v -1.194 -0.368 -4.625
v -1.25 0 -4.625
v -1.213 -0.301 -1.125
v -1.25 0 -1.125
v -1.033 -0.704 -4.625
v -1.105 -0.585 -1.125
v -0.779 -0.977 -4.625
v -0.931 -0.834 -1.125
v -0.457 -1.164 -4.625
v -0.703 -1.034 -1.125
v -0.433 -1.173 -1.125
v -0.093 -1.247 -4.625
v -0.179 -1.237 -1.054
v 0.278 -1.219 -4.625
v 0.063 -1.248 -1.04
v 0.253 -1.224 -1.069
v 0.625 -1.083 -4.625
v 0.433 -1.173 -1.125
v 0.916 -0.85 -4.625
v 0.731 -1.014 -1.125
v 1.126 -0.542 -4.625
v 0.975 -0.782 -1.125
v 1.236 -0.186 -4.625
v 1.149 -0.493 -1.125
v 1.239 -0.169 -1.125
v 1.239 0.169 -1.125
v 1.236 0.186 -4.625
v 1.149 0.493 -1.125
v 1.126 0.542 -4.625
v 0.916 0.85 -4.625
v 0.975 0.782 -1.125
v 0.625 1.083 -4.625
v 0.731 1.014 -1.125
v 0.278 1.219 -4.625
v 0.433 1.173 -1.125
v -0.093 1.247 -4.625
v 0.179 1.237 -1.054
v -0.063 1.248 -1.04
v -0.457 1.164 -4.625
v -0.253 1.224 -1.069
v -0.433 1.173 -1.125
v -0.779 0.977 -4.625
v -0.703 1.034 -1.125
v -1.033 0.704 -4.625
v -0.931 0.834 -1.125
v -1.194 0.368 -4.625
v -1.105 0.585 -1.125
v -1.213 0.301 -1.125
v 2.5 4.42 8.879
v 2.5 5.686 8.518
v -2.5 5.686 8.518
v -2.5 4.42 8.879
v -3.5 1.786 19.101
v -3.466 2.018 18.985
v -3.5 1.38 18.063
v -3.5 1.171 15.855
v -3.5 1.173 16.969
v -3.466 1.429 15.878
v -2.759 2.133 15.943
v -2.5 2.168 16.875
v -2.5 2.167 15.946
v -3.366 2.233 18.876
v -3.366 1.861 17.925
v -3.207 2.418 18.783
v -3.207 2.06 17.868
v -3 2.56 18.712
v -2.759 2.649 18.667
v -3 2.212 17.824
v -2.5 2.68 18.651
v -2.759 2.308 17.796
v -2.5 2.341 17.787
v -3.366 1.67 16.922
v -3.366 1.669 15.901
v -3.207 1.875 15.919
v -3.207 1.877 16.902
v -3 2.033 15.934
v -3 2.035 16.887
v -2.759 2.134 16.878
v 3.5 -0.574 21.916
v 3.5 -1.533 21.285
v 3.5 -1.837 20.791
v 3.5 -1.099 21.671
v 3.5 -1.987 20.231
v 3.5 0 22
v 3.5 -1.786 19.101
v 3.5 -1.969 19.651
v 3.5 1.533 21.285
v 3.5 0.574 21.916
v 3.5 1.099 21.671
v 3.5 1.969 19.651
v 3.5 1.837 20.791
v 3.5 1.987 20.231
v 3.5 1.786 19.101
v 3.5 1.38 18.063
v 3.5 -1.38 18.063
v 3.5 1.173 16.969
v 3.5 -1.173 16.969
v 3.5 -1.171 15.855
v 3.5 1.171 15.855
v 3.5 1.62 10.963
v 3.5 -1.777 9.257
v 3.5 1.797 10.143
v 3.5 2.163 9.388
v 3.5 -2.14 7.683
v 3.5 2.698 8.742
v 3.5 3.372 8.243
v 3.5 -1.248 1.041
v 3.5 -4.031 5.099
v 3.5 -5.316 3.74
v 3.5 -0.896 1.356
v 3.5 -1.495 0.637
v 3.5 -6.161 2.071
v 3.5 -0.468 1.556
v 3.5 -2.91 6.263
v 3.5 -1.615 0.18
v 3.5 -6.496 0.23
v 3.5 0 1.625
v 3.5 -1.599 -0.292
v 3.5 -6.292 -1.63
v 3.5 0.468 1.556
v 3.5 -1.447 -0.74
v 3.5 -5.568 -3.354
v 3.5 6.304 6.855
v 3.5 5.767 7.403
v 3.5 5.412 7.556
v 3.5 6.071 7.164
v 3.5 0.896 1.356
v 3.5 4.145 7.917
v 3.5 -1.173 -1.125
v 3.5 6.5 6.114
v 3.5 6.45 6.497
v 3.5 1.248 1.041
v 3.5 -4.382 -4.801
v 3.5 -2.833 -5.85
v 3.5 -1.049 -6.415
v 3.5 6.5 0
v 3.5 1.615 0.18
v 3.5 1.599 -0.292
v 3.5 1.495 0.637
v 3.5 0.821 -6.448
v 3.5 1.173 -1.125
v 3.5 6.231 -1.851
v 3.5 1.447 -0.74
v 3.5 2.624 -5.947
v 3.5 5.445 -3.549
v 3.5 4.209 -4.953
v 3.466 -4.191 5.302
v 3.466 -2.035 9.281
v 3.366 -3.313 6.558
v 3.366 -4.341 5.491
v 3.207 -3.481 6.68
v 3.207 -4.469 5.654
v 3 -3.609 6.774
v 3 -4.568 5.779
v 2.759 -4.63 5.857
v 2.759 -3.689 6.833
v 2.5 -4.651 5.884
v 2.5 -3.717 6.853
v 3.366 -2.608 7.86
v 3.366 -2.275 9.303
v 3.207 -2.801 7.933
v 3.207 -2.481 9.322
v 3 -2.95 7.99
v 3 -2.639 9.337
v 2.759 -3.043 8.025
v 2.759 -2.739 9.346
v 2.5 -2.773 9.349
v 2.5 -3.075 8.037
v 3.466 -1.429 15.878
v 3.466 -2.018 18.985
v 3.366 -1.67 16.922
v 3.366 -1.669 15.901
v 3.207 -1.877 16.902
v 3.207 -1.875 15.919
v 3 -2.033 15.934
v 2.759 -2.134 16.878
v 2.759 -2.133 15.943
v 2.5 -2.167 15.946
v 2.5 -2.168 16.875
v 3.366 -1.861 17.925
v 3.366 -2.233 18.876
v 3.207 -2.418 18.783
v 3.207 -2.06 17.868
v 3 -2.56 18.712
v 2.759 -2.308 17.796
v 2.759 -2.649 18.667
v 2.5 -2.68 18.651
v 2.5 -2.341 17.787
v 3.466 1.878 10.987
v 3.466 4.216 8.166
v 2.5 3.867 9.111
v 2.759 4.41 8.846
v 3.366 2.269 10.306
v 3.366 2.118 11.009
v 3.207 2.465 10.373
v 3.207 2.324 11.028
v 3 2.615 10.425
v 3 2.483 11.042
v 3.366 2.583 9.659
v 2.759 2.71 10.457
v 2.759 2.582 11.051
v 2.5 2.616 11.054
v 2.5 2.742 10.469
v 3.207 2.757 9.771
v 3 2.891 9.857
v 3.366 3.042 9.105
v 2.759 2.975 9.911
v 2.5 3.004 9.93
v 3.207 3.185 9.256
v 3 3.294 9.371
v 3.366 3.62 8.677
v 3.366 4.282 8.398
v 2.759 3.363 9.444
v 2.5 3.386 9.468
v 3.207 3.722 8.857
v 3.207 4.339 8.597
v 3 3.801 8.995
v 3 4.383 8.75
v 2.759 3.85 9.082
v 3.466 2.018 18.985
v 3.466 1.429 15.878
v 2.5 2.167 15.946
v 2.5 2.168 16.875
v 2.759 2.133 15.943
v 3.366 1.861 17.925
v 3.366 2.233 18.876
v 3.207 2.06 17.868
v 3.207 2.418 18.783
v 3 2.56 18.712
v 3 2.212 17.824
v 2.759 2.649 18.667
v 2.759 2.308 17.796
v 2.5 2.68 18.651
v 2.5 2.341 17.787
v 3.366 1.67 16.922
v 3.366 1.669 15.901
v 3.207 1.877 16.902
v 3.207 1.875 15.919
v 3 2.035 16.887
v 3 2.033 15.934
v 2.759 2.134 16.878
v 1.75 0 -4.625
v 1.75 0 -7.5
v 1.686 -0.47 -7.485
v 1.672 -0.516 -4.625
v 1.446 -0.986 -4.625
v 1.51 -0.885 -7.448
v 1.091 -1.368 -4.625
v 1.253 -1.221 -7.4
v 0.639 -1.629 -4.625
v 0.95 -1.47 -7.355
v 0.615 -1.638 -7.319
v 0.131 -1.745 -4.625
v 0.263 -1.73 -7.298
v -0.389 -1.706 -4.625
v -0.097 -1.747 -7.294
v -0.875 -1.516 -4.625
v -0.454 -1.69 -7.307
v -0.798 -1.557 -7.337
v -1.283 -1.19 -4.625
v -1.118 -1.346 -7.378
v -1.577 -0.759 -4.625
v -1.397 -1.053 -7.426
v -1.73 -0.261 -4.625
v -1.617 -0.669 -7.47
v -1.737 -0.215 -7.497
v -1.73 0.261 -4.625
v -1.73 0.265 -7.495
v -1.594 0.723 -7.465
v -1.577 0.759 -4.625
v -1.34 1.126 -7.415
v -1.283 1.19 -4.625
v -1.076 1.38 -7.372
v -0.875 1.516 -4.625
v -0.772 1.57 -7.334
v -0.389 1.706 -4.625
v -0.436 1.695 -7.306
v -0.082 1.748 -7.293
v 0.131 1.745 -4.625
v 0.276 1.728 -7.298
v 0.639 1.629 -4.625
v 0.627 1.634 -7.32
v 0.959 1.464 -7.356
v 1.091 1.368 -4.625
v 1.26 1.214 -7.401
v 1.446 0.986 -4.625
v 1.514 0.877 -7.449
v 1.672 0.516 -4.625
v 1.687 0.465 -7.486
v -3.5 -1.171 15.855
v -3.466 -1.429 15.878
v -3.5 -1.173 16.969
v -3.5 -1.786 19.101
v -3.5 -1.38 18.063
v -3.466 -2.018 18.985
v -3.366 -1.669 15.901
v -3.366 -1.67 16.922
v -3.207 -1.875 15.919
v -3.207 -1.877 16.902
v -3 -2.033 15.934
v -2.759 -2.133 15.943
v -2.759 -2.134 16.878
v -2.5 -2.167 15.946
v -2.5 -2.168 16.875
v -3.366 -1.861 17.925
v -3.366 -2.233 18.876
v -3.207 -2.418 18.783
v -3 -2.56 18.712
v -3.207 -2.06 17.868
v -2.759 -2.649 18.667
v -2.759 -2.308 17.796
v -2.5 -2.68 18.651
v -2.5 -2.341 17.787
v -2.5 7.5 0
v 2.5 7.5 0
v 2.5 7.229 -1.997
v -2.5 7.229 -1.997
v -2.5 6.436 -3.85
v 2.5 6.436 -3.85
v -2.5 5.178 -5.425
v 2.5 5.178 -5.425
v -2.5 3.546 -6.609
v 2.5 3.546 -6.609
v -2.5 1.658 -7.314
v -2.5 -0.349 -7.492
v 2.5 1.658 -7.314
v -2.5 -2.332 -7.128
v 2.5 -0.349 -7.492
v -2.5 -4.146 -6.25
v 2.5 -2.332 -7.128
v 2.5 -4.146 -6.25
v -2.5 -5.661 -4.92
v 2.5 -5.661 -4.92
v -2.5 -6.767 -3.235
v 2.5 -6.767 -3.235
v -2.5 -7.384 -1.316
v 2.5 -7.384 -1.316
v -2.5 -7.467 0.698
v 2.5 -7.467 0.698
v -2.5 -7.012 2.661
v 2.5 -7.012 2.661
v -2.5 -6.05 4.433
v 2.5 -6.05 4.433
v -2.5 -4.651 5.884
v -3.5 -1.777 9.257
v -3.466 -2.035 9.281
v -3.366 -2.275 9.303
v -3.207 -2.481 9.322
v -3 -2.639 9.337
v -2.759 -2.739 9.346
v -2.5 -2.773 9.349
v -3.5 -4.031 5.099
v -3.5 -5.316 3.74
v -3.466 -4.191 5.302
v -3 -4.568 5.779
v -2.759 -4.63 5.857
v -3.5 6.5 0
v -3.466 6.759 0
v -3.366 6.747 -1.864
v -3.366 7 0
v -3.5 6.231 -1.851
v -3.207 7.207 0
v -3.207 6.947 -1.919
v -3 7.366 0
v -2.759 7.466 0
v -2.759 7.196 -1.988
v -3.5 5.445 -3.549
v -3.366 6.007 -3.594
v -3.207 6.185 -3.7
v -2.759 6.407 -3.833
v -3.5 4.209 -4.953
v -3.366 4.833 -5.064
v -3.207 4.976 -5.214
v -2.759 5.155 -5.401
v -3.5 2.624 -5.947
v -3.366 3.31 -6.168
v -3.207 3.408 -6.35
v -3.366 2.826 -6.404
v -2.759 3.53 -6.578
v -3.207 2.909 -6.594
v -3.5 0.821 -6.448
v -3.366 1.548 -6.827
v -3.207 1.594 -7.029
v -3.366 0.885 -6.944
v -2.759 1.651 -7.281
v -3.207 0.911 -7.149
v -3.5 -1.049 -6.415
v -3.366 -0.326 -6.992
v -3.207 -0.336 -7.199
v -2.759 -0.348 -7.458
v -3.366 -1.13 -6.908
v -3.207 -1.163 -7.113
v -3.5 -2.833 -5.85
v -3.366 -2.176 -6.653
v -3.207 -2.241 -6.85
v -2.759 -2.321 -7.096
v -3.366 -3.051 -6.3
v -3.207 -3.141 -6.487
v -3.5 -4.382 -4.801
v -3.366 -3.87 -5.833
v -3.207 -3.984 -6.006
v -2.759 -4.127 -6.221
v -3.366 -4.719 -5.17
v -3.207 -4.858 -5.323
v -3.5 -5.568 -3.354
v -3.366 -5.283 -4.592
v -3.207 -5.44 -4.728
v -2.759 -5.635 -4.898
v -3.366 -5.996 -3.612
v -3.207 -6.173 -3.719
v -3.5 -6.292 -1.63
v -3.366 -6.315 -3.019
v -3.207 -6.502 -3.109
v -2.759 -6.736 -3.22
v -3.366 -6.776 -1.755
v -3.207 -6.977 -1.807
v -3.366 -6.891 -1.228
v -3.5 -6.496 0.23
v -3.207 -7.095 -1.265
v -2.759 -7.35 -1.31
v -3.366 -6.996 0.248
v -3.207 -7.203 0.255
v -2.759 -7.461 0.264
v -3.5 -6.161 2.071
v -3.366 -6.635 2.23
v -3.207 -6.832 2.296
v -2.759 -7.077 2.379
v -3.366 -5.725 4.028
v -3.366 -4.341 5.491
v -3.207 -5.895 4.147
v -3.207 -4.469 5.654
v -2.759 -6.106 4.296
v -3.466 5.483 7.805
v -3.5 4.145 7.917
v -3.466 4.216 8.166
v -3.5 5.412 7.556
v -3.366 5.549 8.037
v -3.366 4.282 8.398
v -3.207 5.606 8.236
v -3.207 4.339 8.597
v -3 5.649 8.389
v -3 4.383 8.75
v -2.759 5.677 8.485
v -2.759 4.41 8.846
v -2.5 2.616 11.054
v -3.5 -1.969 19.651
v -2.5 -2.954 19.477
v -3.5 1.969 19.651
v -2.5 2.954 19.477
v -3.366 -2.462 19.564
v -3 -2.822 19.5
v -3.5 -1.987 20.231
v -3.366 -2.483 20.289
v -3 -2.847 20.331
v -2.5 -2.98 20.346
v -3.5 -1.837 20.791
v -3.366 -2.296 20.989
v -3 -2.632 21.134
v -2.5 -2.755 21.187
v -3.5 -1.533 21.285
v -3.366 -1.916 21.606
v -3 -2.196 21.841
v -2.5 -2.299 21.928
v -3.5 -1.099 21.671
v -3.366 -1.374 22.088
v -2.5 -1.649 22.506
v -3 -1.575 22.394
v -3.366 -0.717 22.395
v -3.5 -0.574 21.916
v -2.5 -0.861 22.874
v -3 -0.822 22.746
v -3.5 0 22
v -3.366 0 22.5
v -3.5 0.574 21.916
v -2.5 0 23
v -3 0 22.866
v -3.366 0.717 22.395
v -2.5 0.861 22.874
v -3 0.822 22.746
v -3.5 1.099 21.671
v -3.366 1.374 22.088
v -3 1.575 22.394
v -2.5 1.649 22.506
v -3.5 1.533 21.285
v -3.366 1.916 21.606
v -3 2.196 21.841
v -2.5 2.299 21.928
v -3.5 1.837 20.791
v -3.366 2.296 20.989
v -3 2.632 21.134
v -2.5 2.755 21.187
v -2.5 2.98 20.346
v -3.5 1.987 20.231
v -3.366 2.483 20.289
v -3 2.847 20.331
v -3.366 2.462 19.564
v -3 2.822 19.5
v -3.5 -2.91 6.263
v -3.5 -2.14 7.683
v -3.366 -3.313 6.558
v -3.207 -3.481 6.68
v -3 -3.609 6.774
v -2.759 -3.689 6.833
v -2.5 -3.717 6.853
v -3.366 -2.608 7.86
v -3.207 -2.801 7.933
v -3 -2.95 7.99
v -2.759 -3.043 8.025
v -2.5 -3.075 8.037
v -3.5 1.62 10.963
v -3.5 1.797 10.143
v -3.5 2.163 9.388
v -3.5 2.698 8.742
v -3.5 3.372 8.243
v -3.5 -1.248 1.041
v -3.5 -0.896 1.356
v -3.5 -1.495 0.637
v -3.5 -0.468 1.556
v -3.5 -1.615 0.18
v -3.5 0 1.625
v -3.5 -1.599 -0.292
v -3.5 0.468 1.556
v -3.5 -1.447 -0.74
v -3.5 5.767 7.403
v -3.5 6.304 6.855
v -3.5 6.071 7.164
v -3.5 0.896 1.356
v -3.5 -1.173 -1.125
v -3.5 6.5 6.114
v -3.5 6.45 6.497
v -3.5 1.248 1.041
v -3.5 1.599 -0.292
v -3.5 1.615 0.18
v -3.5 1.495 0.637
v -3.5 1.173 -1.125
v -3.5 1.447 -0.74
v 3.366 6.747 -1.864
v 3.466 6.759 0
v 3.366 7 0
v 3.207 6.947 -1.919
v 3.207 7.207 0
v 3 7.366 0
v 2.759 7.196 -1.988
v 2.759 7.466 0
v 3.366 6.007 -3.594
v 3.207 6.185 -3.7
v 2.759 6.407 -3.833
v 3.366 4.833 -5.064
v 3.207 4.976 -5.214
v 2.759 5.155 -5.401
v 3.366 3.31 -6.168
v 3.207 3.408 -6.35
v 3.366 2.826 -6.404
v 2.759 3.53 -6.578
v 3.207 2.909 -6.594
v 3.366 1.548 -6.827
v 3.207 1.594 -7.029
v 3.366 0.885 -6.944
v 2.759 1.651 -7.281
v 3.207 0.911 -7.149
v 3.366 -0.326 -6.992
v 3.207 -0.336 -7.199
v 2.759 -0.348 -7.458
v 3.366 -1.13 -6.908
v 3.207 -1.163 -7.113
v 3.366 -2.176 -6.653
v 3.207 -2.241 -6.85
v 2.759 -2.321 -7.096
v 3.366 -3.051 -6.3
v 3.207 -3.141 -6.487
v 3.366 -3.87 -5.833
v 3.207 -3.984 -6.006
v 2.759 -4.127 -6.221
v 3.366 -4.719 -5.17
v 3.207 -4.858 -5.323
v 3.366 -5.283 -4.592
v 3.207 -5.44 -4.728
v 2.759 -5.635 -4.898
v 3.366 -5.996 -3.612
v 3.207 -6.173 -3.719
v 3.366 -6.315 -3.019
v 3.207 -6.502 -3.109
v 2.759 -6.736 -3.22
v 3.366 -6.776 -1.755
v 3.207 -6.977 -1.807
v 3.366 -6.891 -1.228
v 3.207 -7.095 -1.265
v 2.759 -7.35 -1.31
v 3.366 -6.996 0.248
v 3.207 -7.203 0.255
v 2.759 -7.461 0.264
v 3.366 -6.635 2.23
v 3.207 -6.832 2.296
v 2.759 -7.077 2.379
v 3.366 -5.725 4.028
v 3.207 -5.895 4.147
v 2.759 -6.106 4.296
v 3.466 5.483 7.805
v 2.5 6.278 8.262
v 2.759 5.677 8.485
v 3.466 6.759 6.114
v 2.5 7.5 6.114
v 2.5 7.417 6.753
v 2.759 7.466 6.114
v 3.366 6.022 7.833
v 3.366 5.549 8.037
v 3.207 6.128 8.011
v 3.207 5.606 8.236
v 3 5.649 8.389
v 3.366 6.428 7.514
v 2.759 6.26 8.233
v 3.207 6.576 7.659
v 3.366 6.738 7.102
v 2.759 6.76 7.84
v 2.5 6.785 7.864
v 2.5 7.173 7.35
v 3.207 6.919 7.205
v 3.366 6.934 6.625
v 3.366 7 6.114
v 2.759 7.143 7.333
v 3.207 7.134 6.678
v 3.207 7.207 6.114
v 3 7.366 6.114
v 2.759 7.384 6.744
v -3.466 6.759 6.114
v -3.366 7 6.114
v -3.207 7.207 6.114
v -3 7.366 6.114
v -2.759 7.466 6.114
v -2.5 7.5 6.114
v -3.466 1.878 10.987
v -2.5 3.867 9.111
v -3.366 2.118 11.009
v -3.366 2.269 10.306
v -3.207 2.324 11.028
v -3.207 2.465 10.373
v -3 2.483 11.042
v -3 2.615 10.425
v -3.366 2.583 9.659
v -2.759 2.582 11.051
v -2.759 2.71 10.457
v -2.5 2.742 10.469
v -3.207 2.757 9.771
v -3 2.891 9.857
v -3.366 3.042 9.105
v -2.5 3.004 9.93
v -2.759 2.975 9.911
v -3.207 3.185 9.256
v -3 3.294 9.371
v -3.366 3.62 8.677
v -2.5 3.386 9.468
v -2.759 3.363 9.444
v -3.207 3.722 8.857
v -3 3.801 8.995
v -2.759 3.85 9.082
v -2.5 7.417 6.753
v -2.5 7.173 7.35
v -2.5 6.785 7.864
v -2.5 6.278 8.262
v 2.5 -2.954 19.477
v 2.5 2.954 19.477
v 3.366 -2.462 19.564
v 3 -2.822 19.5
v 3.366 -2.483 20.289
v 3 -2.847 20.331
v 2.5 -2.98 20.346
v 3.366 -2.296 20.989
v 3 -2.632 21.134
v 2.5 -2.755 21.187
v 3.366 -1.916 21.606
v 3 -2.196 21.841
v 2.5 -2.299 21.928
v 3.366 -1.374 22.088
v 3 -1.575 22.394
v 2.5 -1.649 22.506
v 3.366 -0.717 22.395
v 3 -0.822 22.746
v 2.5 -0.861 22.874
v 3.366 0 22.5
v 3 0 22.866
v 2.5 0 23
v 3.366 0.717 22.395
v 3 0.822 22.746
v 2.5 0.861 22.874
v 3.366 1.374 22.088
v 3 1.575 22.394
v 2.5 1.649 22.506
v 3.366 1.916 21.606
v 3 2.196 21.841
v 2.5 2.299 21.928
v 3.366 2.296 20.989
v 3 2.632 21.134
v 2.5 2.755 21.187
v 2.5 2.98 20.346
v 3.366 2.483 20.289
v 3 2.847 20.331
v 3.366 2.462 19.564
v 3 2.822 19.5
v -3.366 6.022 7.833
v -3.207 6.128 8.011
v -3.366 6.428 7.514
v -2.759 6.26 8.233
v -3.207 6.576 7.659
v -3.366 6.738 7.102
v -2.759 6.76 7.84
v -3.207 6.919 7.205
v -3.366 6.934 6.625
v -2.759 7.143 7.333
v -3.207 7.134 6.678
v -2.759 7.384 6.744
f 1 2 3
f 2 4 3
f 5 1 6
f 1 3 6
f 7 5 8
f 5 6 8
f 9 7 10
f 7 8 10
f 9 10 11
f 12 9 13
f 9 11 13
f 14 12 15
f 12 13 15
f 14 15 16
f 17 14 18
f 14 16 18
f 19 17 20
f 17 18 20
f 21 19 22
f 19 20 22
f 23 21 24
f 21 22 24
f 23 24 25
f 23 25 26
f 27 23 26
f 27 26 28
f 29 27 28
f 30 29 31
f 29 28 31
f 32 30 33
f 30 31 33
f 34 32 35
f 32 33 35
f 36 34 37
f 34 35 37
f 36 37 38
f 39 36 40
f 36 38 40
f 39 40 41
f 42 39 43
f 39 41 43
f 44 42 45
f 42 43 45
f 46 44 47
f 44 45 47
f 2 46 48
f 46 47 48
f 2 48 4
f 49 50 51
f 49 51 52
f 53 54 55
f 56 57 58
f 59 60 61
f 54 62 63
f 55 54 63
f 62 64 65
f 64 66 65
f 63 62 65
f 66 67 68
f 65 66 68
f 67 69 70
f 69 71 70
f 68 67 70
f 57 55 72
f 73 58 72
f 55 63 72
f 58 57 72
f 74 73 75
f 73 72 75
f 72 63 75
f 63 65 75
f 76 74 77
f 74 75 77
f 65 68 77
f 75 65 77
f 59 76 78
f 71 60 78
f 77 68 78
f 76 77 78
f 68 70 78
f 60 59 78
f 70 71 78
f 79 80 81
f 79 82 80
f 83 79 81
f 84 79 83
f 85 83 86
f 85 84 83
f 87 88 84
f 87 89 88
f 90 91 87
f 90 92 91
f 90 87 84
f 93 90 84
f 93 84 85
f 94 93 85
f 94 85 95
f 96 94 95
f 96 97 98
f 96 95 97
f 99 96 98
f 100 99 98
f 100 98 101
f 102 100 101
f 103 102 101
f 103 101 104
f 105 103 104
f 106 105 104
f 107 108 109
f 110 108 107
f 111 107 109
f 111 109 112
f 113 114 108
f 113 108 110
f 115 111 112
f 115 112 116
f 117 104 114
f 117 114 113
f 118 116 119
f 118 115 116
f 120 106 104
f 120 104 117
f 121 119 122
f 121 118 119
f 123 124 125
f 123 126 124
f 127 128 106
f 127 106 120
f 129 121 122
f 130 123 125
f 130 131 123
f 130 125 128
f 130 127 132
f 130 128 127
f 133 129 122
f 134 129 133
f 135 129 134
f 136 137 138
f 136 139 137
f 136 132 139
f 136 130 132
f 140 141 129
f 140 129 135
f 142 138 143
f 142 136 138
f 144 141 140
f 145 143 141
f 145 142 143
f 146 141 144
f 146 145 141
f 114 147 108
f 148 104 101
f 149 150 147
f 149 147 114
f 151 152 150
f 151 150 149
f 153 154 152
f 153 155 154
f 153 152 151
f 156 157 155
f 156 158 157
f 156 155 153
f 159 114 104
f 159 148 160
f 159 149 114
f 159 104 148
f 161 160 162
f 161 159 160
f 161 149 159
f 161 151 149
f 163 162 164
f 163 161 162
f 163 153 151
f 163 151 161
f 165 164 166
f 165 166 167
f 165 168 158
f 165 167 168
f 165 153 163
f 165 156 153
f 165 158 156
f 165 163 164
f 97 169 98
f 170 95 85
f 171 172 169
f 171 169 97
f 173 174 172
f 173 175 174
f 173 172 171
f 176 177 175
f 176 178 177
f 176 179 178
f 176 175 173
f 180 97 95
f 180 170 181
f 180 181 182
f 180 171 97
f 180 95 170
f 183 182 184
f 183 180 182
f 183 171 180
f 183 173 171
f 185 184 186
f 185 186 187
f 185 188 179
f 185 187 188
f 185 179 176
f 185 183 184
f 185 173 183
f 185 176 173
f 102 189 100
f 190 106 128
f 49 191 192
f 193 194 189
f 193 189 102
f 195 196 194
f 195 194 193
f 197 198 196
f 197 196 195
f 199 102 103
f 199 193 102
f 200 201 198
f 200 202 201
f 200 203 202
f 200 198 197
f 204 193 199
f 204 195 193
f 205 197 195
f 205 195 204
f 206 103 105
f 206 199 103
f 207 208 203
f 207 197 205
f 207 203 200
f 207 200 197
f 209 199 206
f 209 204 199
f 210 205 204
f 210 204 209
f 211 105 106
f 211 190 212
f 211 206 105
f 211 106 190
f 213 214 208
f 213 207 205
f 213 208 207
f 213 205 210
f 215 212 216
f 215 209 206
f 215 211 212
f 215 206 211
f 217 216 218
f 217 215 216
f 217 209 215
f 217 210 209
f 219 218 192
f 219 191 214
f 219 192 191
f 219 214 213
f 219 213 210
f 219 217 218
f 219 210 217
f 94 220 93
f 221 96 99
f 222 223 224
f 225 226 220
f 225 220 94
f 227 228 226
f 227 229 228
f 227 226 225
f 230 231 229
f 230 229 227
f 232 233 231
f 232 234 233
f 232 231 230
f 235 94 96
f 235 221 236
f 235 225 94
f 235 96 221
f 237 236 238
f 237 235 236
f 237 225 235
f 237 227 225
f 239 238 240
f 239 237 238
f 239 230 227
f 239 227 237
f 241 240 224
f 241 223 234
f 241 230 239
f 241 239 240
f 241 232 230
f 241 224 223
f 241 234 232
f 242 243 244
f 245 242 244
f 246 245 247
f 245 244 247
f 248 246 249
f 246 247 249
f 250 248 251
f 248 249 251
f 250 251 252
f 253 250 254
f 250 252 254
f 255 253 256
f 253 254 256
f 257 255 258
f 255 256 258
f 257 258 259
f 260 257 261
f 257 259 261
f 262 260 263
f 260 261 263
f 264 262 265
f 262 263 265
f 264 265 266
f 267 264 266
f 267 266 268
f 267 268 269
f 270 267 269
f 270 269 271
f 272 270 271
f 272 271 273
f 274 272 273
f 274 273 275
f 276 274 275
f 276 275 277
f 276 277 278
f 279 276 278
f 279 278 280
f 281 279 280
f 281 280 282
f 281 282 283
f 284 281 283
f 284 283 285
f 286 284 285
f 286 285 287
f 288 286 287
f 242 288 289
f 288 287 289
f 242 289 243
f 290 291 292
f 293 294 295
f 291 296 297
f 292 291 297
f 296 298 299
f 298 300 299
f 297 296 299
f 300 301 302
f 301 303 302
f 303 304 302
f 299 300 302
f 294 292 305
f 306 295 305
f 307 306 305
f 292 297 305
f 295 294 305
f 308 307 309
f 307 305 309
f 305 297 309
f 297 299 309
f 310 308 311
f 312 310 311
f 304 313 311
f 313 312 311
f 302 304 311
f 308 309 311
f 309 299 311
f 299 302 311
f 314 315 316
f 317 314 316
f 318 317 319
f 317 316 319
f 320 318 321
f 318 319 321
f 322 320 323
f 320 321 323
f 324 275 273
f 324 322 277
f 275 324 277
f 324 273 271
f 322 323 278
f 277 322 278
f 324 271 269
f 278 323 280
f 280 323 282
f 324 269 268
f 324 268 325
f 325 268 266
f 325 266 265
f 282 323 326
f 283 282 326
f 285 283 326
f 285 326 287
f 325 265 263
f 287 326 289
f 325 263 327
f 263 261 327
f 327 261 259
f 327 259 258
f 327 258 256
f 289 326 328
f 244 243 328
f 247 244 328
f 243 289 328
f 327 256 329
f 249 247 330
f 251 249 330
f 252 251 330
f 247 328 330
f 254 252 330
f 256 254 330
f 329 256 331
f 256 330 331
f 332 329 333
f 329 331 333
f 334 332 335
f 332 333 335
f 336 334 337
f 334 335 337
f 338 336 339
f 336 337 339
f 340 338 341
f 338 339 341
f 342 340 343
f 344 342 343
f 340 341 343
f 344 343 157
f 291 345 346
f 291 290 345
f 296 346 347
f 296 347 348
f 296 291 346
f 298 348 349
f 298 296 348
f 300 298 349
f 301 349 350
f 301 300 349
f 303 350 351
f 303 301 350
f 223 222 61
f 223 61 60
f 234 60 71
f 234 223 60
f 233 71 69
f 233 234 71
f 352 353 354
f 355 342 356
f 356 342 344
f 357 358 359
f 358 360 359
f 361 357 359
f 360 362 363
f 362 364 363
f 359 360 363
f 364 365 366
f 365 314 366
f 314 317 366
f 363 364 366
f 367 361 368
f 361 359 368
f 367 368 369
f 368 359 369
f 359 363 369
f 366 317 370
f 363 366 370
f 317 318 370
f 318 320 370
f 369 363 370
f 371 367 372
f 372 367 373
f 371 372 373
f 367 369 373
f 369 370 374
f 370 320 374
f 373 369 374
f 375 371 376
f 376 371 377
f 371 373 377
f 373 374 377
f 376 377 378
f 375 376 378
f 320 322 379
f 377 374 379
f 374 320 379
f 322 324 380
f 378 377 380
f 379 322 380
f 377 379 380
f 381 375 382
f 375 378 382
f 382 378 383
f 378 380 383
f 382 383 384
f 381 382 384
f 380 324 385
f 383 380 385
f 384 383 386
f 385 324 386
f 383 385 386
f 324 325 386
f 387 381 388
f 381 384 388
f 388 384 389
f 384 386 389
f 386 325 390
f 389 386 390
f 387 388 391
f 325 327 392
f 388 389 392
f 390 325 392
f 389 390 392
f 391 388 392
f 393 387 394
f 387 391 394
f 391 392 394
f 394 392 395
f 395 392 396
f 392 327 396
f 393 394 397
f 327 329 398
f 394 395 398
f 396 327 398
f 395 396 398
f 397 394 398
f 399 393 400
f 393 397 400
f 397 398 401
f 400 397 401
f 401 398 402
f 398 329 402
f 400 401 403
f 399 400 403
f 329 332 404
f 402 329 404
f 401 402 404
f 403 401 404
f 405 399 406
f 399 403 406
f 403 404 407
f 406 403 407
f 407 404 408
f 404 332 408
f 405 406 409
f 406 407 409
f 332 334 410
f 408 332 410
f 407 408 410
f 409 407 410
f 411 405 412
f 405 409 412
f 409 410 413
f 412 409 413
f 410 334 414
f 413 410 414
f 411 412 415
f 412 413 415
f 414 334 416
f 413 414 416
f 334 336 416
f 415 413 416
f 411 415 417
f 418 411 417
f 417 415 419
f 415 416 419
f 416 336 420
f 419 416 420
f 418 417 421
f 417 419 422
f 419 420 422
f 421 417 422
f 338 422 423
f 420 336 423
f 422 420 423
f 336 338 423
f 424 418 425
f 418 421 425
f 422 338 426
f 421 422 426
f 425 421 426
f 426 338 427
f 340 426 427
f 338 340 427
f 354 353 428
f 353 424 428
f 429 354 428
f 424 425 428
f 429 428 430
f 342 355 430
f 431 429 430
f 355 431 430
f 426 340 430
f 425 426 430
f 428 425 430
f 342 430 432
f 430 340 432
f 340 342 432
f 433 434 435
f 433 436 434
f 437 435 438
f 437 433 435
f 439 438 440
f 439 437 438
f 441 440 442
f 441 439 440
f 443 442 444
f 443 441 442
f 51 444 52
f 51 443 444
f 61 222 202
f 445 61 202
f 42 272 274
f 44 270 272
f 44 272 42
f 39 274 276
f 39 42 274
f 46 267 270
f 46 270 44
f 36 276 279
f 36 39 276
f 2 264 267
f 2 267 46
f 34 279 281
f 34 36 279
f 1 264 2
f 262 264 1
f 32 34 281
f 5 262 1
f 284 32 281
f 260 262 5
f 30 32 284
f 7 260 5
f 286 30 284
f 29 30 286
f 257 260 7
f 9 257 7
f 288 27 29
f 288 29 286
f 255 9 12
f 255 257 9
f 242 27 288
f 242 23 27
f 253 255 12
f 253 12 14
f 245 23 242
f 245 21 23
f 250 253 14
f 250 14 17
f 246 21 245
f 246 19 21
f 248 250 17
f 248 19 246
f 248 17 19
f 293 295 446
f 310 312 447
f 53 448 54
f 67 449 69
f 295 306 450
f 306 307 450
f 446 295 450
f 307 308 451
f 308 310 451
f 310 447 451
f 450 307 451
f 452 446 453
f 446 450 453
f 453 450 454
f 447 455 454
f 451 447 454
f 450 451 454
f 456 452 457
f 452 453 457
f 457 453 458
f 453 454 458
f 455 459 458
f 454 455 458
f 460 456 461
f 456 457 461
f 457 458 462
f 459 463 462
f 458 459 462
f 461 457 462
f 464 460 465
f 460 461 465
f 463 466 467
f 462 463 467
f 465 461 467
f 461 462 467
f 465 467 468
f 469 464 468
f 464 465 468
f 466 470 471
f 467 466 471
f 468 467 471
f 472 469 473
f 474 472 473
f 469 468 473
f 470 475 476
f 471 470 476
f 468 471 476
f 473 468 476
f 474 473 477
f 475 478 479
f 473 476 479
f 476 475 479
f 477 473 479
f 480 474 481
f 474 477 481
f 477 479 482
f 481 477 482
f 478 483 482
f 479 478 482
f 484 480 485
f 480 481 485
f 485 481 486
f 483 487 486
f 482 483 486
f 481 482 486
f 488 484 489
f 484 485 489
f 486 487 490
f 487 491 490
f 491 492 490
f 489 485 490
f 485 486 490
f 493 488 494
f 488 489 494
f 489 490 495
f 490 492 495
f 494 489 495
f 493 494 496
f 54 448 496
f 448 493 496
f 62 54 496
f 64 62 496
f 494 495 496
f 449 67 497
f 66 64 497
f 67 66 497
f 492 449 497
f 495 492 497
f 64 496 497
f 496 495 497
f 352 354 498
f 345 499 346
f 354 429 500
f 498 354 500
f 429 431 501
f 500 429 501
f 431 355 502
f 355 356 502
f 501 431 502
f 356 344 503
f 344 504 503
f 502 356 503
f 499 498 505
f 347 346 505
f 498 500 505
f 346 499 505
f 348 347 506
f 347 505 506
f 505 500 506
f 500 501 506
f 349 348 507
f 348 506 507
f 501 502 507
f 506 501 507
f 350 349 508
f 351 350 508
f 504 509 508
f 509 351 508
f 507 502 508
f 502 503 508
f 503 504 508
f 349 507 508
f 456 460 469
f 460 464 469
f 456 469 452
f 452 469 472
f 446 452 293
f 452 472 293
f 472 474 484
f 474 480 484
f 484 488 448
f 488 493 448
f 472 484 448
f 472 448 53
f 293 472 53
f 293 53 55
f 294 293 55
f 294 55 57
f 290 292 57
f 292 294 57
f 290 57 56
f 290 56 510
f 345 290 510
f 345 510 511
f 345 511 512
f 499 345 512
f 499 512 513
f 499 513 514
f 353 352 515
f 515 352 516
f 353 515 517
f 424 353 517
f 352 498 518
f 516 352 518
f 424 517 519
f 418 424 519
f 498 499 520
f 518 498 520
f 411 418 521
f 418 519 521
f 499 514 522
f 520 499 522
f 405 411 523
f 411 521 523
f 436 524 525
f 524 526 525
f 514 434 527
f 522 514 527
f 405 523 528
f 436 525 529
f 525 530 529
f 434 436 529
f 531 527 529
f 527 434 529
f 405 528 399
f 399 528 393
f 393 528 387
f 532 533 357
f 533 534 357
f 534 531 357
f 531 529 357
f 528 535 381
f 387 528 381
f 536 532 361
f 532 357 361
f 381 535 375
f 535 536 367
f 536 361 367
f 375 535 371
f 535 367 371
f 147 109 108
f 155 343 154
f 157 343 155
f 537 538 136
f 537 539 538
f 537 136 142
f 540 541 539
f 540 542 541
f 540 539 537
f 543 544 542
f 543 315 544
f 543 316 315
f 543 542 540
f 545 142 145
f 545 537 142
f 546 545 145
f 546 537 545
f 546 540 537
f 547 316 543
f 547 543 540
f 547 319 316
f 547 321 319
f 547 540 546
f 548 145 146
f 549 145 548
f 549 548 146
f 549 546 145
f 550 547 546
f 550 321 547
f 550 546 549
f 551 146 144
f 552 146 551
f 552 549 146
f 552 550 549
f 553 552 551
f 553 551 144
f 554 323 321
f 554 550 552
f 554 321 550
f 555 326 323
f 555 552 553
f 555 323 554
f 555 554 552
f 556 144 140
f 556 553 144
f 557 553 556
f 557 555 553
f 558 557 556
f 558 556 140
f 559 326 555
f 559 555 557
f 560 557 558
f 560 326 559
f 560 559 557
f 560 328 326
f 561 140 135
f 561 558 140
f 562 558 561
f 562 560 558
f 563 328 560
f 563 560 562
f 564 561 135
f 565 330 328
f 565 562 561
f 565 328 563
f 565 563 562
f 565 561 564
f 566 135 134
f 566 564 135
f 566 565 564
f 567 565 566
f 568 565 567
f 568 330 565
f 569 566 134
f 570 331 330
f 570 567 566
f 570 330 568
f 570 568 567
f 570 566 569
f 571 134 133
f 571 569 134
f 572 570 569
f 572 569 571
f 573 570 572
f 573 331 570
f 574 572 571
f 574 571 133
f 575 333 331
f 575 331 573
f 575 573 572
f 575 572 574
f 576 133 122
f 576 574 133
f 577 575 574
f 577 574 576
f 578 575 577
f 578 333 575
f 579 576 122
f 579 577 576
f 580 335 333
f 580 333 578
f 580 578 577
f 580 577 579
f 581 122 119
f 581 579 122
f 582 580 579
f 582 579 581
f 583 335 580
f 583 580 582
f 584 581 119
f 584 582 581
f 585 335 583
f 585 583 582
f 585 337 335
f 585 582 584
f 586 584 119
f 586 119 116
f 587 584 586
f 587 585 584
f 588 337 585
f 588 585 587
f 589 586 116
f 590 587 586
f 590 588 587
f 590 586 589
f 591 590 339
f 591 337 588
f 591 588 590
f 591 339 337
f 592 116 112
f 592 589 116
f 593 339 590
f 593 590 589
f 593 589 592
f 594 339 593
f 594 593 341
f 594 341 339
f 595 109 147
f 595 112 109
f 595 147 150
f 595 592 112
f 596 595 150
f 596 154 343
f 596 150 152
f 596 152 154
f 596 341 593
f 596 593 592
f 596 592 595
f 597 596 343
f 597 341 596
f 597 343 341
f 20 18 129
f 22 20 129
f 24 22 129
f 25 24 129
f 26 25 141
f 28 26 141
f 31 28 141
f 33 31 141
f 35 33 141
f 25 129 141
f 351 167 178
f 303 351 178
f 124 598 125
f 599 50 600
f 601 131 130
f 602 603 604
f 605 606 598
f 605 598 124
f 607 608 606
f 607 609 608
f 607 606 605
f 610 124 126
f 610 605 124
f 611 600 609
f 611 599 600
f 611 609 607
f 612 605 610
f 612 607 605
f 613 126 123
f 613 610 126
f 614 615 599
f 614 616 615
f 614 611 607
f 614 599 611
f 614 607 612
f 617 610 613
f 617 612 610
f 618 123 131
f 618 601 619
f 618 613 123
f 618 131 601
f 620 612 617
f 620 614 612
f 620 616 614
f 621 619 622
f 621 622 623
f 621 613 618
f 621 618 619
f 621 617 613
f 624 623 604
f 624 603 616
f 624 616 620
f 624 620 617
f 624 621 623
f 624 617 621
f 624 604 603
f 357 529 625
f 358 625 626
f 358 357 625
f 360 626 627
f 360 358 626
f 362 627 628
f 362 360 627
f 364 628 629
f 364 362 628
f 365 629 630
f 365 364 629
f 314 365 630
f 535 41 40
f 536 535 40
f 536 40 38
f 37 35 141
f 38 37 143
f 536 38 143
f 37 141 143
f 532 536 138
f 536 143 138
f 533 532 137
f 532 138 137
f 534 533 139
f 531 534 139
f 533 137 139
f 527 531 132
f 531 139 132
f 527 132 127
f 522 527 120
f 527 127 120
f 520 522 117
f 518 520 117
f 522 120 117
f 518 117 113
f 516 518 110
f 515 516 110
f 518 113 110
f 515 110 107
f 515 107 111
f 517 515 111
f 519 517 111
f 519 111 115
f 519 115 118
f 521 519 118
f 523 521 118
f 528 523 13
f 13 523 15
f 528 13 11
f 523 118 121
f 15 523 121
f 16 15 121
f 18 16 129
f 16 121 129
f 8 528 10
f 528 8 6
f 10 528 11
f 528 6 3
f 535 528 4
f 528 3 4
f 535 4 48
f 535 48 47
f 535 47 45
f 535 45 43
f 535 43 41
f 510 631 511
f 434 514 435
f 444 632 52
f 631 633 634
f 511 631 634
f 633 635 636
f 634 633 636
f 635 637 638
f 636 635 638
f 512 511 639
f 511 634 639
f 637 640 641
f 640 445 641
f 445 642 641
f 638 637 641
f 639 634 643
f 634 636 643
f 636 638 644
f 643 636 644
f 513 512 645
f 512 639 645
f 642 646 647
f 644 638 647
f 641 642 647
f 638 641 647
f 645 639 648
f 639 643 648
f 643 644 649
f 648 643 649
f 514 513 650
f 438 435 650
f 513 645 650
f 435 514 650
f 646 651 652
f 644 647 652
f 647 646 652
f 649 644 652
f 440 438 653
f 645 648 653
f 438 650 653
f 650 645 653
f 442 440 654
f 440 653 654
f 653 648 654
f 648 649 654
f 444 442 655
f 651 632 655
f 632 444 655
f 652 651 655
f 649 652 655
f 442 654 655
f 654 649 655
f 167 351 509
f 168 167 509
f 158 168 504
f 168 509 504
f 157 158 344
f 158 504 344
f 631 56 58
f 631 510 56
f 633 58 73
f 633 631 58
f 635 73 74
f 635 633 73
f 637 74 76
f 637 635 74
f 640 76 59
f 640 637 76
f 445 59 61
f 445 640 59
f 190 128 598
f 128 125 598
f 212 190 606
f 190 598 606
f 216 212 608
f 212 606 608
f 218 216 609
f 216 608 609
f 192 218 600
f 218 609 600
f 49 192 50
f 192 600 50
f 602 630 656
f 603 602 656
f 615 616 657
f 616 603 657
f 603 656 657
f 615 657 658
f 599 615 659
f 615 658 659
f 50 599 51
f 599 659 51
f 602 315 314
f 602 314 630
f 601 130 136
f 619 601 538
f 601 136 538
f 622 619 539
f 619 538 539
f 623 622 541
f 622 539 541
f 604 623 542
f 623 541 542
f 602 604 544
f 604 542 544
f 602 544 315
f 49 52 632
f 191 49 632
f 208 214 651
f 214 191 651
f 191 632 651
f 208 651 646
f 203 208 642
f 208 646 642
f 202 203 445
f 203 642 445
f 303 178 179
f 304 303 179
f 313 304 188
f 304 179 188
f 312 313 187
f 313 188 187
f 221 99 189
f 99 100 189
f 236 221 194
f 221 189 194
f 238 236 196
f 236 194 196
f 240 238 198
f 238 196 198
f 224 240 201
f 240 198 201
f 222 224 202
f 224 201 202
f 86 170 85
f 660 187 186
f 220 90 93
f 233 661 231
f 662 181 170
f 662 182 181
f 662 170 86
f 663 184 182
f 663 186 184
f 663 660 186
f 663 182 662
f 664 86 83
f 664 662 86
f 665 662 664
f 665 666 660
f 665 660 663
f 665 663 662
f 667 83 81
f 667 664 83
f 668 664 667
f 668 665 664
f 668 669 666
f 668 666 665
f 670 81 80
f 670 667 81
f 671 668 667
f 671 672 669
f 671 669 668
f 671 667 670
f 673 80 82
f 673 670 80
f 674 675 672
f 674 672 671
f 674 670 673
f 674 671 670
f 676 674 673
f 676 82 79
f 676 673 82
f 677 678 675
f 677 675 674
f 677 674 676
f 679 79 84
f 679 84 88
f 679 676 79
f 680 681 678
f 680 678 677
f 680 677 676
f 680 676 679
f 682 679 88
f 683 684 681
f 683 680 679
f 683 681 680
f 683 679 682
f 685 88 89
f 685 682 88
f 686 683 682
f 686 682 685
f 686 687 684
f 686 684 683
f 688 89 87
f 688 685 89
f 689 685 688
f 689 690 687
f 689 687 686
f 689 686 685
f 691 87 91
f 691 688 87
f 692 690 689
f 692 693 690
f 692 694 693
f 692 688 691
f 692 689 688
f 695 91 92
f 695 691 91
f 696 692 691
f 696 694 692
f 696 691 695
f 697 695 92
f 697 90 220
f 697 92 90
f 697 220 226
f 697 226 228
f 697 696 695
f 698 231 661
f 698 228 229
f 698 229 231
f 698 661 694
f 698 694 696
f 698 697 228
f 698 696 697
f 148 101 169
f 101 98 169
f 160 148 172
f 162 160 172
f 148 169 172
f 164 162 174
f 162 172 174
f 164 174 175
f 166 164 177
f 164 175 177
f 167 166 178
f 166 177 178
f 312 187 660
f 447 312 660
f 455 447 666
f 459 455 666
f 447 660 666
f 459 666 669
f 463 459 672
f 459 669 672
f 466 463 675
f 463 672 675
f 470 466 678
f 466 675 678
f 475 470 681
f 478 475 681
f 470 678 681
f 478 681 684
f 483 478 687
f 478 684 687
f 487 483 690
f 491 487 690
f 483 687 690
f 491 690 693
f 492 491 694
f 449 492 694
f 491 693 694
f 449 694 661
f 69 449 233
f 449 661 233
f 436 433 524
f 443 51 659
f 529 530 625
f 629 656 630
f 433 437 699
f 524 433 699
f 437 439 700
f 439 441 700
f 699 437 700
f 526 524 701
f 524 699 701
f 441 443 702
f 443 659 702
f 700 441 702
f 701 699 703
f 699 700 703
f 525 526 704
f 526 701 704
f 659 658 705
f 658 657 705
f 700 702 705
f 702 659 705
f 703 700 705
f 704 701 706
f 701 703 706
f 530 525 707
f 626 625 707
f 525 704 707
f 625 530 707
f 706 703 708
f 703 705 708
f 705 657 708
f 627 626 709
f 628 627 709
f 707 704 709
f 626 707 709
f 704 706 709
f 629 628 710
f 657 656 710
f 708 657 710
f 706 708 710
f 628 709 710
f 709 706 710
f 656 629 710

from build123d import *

# Parameters (mm, degrees)
BOSS_EXTRUDE1_DEPTH = 3.5
FILLET1_R           = 5
HOLE1_D             = 2.5
HOLE1_DEPTH         = 8
HOLE1_CBORE_D       = 3.5
HOLE1_CBORE_DEPTH   = 3
BOSS_EXTRUDE2_DEPTH = 7
FILLET3_R           = 2.5
FILLET2_R           = 1


with BuildPart() as part:
    # Sketch1 → Boss-Extrude1 (new, symmetric)
    with BuildSketch(Plane(origin=(0, 0, 0), x_dir=(0, 0, -1), z_dir=(1, 0, 0))):
        with BuildLine():
            Line((-17.763932023, 2), (-6.873863542, 3))
            ThreePointArc((-6.873863542, 3), (7.5, 0), (-6.873863542, -3))
            Line((-6.873863542, -3), (-17.763932023, -2))
            ThreePointArc((-17.763932023, -2), (-23, 0), (-17.763932023, 2))
        make_face()
        with BuildLine():
            Line((1.125, -1.17260394), (1.125, 1.17260394))
            ThreePointArc((1.125, 1.17260394), (-1.625, 0), (1.125, -1.17260394))
        make_face(mode=Mode.SUBTRACT)
    extrude(amount=BOSS_EXTRUDE1_DEPTH, both=True)

    # Fillet1
    fillet1_edges = [part.edges().sort_by_distance(p)[0] for p in [
        (0, 2, 17.763932023),
        (0, 3, 6.873863542),
        (0, -3, 6.873863542),
        (0, -2, 17.763932023),
    ]]
    fillet(fillet1_edges, radius=FILLET1_R)

    # Hole1
    with Locations(Plane(origin=(0, 0, -7.625), x_dir=(1, 0, 0), z_dir=(0, 0, -1))):
        with Locations((0, 0)):
            CounterBoreHole(HOLE1_D / 2, HOLE1_CBORE_D / 2, HOLE1_CBORE_DEPTH, depth=HOLE1_DEPTH)

    # Sketch4 → Boss-Extrude2 (add, through all)
    with BuildSketch(Plane(origin=(3.5, 0, 0), x_dir=(0, 0, -1), z_dir=(1, 0, 0))):
        with BuildLine():
            Line((0, 7.5), (-8, 7.5))
            Line((-8, 7.5), (-9.348908132, 2.772724607))
            ThreePointArc((-9.348908132, 2.772724607), (-7.423390623, 3.356027744), (-5.883671087, 4.651065957))
            ThreePointArc((-5.883671087, 4.651065957), (-3.268562782, 6.750296093), (0, 7.5))
        make_face()
    extrude(amount=-BOSS_EXTRUDE2_DEPTH)

    # Fillet3
    fillet3_edges = [part.edges().sort_by_distance(p)[0] for p in [
        (0, 2.772724607, 9.348908132),
        (0, 7.5, 8),
    ]]
    fillet(fillet3_edges, radius=FILLET3_R)

    # Fillet2
    fillet2_edges = [part.edges().sort_by_distance(p)[0] for p in [
        (-3.5, 0, 23),
        (3.5, 0, 23),
        (-3.5, -3.268562782, -6.750296093),
        (3.5, -3.268562782, -6.750296093),
        (-3.5, -2.469818808, 12.647573032),
        (3.5, -2.469818808, 12.647573032),
        (-3.5, 2.233464618, 17.334759204),
        (3.5, 2.233464618, 17.334759204),
        (-3.5, -3.356027744, 7.423390623),
        (3.5, -3.356027744, 7.423390623),
        (-3.5, -2.233464618, 17.334759204),
        (3.5, -2.233464618, 17.334759204),
        (-3.5, 7.5, 3.056789081),
        (3.5, 7.5, 3.056789081),
        (-3.5, 2.391513819, 13.50031972),
        (3.5, 2.391513819, 13.50031972),
        (3.5, 5.052820312, 8.698292421),
        (-3.5, 5.052820312, 8.698292421),
        (3.5, 6.995615118, 7.619406937),
        (-3.5, 6.995615118, 7.619406937),
        (-3.5, 3.181037085, 9.687418633),
        (3.5, 3.181037085, 9.687418633),
    ]]
    fillet(fillet2_edges, radius=FILLET2_R)


solid = part.part
